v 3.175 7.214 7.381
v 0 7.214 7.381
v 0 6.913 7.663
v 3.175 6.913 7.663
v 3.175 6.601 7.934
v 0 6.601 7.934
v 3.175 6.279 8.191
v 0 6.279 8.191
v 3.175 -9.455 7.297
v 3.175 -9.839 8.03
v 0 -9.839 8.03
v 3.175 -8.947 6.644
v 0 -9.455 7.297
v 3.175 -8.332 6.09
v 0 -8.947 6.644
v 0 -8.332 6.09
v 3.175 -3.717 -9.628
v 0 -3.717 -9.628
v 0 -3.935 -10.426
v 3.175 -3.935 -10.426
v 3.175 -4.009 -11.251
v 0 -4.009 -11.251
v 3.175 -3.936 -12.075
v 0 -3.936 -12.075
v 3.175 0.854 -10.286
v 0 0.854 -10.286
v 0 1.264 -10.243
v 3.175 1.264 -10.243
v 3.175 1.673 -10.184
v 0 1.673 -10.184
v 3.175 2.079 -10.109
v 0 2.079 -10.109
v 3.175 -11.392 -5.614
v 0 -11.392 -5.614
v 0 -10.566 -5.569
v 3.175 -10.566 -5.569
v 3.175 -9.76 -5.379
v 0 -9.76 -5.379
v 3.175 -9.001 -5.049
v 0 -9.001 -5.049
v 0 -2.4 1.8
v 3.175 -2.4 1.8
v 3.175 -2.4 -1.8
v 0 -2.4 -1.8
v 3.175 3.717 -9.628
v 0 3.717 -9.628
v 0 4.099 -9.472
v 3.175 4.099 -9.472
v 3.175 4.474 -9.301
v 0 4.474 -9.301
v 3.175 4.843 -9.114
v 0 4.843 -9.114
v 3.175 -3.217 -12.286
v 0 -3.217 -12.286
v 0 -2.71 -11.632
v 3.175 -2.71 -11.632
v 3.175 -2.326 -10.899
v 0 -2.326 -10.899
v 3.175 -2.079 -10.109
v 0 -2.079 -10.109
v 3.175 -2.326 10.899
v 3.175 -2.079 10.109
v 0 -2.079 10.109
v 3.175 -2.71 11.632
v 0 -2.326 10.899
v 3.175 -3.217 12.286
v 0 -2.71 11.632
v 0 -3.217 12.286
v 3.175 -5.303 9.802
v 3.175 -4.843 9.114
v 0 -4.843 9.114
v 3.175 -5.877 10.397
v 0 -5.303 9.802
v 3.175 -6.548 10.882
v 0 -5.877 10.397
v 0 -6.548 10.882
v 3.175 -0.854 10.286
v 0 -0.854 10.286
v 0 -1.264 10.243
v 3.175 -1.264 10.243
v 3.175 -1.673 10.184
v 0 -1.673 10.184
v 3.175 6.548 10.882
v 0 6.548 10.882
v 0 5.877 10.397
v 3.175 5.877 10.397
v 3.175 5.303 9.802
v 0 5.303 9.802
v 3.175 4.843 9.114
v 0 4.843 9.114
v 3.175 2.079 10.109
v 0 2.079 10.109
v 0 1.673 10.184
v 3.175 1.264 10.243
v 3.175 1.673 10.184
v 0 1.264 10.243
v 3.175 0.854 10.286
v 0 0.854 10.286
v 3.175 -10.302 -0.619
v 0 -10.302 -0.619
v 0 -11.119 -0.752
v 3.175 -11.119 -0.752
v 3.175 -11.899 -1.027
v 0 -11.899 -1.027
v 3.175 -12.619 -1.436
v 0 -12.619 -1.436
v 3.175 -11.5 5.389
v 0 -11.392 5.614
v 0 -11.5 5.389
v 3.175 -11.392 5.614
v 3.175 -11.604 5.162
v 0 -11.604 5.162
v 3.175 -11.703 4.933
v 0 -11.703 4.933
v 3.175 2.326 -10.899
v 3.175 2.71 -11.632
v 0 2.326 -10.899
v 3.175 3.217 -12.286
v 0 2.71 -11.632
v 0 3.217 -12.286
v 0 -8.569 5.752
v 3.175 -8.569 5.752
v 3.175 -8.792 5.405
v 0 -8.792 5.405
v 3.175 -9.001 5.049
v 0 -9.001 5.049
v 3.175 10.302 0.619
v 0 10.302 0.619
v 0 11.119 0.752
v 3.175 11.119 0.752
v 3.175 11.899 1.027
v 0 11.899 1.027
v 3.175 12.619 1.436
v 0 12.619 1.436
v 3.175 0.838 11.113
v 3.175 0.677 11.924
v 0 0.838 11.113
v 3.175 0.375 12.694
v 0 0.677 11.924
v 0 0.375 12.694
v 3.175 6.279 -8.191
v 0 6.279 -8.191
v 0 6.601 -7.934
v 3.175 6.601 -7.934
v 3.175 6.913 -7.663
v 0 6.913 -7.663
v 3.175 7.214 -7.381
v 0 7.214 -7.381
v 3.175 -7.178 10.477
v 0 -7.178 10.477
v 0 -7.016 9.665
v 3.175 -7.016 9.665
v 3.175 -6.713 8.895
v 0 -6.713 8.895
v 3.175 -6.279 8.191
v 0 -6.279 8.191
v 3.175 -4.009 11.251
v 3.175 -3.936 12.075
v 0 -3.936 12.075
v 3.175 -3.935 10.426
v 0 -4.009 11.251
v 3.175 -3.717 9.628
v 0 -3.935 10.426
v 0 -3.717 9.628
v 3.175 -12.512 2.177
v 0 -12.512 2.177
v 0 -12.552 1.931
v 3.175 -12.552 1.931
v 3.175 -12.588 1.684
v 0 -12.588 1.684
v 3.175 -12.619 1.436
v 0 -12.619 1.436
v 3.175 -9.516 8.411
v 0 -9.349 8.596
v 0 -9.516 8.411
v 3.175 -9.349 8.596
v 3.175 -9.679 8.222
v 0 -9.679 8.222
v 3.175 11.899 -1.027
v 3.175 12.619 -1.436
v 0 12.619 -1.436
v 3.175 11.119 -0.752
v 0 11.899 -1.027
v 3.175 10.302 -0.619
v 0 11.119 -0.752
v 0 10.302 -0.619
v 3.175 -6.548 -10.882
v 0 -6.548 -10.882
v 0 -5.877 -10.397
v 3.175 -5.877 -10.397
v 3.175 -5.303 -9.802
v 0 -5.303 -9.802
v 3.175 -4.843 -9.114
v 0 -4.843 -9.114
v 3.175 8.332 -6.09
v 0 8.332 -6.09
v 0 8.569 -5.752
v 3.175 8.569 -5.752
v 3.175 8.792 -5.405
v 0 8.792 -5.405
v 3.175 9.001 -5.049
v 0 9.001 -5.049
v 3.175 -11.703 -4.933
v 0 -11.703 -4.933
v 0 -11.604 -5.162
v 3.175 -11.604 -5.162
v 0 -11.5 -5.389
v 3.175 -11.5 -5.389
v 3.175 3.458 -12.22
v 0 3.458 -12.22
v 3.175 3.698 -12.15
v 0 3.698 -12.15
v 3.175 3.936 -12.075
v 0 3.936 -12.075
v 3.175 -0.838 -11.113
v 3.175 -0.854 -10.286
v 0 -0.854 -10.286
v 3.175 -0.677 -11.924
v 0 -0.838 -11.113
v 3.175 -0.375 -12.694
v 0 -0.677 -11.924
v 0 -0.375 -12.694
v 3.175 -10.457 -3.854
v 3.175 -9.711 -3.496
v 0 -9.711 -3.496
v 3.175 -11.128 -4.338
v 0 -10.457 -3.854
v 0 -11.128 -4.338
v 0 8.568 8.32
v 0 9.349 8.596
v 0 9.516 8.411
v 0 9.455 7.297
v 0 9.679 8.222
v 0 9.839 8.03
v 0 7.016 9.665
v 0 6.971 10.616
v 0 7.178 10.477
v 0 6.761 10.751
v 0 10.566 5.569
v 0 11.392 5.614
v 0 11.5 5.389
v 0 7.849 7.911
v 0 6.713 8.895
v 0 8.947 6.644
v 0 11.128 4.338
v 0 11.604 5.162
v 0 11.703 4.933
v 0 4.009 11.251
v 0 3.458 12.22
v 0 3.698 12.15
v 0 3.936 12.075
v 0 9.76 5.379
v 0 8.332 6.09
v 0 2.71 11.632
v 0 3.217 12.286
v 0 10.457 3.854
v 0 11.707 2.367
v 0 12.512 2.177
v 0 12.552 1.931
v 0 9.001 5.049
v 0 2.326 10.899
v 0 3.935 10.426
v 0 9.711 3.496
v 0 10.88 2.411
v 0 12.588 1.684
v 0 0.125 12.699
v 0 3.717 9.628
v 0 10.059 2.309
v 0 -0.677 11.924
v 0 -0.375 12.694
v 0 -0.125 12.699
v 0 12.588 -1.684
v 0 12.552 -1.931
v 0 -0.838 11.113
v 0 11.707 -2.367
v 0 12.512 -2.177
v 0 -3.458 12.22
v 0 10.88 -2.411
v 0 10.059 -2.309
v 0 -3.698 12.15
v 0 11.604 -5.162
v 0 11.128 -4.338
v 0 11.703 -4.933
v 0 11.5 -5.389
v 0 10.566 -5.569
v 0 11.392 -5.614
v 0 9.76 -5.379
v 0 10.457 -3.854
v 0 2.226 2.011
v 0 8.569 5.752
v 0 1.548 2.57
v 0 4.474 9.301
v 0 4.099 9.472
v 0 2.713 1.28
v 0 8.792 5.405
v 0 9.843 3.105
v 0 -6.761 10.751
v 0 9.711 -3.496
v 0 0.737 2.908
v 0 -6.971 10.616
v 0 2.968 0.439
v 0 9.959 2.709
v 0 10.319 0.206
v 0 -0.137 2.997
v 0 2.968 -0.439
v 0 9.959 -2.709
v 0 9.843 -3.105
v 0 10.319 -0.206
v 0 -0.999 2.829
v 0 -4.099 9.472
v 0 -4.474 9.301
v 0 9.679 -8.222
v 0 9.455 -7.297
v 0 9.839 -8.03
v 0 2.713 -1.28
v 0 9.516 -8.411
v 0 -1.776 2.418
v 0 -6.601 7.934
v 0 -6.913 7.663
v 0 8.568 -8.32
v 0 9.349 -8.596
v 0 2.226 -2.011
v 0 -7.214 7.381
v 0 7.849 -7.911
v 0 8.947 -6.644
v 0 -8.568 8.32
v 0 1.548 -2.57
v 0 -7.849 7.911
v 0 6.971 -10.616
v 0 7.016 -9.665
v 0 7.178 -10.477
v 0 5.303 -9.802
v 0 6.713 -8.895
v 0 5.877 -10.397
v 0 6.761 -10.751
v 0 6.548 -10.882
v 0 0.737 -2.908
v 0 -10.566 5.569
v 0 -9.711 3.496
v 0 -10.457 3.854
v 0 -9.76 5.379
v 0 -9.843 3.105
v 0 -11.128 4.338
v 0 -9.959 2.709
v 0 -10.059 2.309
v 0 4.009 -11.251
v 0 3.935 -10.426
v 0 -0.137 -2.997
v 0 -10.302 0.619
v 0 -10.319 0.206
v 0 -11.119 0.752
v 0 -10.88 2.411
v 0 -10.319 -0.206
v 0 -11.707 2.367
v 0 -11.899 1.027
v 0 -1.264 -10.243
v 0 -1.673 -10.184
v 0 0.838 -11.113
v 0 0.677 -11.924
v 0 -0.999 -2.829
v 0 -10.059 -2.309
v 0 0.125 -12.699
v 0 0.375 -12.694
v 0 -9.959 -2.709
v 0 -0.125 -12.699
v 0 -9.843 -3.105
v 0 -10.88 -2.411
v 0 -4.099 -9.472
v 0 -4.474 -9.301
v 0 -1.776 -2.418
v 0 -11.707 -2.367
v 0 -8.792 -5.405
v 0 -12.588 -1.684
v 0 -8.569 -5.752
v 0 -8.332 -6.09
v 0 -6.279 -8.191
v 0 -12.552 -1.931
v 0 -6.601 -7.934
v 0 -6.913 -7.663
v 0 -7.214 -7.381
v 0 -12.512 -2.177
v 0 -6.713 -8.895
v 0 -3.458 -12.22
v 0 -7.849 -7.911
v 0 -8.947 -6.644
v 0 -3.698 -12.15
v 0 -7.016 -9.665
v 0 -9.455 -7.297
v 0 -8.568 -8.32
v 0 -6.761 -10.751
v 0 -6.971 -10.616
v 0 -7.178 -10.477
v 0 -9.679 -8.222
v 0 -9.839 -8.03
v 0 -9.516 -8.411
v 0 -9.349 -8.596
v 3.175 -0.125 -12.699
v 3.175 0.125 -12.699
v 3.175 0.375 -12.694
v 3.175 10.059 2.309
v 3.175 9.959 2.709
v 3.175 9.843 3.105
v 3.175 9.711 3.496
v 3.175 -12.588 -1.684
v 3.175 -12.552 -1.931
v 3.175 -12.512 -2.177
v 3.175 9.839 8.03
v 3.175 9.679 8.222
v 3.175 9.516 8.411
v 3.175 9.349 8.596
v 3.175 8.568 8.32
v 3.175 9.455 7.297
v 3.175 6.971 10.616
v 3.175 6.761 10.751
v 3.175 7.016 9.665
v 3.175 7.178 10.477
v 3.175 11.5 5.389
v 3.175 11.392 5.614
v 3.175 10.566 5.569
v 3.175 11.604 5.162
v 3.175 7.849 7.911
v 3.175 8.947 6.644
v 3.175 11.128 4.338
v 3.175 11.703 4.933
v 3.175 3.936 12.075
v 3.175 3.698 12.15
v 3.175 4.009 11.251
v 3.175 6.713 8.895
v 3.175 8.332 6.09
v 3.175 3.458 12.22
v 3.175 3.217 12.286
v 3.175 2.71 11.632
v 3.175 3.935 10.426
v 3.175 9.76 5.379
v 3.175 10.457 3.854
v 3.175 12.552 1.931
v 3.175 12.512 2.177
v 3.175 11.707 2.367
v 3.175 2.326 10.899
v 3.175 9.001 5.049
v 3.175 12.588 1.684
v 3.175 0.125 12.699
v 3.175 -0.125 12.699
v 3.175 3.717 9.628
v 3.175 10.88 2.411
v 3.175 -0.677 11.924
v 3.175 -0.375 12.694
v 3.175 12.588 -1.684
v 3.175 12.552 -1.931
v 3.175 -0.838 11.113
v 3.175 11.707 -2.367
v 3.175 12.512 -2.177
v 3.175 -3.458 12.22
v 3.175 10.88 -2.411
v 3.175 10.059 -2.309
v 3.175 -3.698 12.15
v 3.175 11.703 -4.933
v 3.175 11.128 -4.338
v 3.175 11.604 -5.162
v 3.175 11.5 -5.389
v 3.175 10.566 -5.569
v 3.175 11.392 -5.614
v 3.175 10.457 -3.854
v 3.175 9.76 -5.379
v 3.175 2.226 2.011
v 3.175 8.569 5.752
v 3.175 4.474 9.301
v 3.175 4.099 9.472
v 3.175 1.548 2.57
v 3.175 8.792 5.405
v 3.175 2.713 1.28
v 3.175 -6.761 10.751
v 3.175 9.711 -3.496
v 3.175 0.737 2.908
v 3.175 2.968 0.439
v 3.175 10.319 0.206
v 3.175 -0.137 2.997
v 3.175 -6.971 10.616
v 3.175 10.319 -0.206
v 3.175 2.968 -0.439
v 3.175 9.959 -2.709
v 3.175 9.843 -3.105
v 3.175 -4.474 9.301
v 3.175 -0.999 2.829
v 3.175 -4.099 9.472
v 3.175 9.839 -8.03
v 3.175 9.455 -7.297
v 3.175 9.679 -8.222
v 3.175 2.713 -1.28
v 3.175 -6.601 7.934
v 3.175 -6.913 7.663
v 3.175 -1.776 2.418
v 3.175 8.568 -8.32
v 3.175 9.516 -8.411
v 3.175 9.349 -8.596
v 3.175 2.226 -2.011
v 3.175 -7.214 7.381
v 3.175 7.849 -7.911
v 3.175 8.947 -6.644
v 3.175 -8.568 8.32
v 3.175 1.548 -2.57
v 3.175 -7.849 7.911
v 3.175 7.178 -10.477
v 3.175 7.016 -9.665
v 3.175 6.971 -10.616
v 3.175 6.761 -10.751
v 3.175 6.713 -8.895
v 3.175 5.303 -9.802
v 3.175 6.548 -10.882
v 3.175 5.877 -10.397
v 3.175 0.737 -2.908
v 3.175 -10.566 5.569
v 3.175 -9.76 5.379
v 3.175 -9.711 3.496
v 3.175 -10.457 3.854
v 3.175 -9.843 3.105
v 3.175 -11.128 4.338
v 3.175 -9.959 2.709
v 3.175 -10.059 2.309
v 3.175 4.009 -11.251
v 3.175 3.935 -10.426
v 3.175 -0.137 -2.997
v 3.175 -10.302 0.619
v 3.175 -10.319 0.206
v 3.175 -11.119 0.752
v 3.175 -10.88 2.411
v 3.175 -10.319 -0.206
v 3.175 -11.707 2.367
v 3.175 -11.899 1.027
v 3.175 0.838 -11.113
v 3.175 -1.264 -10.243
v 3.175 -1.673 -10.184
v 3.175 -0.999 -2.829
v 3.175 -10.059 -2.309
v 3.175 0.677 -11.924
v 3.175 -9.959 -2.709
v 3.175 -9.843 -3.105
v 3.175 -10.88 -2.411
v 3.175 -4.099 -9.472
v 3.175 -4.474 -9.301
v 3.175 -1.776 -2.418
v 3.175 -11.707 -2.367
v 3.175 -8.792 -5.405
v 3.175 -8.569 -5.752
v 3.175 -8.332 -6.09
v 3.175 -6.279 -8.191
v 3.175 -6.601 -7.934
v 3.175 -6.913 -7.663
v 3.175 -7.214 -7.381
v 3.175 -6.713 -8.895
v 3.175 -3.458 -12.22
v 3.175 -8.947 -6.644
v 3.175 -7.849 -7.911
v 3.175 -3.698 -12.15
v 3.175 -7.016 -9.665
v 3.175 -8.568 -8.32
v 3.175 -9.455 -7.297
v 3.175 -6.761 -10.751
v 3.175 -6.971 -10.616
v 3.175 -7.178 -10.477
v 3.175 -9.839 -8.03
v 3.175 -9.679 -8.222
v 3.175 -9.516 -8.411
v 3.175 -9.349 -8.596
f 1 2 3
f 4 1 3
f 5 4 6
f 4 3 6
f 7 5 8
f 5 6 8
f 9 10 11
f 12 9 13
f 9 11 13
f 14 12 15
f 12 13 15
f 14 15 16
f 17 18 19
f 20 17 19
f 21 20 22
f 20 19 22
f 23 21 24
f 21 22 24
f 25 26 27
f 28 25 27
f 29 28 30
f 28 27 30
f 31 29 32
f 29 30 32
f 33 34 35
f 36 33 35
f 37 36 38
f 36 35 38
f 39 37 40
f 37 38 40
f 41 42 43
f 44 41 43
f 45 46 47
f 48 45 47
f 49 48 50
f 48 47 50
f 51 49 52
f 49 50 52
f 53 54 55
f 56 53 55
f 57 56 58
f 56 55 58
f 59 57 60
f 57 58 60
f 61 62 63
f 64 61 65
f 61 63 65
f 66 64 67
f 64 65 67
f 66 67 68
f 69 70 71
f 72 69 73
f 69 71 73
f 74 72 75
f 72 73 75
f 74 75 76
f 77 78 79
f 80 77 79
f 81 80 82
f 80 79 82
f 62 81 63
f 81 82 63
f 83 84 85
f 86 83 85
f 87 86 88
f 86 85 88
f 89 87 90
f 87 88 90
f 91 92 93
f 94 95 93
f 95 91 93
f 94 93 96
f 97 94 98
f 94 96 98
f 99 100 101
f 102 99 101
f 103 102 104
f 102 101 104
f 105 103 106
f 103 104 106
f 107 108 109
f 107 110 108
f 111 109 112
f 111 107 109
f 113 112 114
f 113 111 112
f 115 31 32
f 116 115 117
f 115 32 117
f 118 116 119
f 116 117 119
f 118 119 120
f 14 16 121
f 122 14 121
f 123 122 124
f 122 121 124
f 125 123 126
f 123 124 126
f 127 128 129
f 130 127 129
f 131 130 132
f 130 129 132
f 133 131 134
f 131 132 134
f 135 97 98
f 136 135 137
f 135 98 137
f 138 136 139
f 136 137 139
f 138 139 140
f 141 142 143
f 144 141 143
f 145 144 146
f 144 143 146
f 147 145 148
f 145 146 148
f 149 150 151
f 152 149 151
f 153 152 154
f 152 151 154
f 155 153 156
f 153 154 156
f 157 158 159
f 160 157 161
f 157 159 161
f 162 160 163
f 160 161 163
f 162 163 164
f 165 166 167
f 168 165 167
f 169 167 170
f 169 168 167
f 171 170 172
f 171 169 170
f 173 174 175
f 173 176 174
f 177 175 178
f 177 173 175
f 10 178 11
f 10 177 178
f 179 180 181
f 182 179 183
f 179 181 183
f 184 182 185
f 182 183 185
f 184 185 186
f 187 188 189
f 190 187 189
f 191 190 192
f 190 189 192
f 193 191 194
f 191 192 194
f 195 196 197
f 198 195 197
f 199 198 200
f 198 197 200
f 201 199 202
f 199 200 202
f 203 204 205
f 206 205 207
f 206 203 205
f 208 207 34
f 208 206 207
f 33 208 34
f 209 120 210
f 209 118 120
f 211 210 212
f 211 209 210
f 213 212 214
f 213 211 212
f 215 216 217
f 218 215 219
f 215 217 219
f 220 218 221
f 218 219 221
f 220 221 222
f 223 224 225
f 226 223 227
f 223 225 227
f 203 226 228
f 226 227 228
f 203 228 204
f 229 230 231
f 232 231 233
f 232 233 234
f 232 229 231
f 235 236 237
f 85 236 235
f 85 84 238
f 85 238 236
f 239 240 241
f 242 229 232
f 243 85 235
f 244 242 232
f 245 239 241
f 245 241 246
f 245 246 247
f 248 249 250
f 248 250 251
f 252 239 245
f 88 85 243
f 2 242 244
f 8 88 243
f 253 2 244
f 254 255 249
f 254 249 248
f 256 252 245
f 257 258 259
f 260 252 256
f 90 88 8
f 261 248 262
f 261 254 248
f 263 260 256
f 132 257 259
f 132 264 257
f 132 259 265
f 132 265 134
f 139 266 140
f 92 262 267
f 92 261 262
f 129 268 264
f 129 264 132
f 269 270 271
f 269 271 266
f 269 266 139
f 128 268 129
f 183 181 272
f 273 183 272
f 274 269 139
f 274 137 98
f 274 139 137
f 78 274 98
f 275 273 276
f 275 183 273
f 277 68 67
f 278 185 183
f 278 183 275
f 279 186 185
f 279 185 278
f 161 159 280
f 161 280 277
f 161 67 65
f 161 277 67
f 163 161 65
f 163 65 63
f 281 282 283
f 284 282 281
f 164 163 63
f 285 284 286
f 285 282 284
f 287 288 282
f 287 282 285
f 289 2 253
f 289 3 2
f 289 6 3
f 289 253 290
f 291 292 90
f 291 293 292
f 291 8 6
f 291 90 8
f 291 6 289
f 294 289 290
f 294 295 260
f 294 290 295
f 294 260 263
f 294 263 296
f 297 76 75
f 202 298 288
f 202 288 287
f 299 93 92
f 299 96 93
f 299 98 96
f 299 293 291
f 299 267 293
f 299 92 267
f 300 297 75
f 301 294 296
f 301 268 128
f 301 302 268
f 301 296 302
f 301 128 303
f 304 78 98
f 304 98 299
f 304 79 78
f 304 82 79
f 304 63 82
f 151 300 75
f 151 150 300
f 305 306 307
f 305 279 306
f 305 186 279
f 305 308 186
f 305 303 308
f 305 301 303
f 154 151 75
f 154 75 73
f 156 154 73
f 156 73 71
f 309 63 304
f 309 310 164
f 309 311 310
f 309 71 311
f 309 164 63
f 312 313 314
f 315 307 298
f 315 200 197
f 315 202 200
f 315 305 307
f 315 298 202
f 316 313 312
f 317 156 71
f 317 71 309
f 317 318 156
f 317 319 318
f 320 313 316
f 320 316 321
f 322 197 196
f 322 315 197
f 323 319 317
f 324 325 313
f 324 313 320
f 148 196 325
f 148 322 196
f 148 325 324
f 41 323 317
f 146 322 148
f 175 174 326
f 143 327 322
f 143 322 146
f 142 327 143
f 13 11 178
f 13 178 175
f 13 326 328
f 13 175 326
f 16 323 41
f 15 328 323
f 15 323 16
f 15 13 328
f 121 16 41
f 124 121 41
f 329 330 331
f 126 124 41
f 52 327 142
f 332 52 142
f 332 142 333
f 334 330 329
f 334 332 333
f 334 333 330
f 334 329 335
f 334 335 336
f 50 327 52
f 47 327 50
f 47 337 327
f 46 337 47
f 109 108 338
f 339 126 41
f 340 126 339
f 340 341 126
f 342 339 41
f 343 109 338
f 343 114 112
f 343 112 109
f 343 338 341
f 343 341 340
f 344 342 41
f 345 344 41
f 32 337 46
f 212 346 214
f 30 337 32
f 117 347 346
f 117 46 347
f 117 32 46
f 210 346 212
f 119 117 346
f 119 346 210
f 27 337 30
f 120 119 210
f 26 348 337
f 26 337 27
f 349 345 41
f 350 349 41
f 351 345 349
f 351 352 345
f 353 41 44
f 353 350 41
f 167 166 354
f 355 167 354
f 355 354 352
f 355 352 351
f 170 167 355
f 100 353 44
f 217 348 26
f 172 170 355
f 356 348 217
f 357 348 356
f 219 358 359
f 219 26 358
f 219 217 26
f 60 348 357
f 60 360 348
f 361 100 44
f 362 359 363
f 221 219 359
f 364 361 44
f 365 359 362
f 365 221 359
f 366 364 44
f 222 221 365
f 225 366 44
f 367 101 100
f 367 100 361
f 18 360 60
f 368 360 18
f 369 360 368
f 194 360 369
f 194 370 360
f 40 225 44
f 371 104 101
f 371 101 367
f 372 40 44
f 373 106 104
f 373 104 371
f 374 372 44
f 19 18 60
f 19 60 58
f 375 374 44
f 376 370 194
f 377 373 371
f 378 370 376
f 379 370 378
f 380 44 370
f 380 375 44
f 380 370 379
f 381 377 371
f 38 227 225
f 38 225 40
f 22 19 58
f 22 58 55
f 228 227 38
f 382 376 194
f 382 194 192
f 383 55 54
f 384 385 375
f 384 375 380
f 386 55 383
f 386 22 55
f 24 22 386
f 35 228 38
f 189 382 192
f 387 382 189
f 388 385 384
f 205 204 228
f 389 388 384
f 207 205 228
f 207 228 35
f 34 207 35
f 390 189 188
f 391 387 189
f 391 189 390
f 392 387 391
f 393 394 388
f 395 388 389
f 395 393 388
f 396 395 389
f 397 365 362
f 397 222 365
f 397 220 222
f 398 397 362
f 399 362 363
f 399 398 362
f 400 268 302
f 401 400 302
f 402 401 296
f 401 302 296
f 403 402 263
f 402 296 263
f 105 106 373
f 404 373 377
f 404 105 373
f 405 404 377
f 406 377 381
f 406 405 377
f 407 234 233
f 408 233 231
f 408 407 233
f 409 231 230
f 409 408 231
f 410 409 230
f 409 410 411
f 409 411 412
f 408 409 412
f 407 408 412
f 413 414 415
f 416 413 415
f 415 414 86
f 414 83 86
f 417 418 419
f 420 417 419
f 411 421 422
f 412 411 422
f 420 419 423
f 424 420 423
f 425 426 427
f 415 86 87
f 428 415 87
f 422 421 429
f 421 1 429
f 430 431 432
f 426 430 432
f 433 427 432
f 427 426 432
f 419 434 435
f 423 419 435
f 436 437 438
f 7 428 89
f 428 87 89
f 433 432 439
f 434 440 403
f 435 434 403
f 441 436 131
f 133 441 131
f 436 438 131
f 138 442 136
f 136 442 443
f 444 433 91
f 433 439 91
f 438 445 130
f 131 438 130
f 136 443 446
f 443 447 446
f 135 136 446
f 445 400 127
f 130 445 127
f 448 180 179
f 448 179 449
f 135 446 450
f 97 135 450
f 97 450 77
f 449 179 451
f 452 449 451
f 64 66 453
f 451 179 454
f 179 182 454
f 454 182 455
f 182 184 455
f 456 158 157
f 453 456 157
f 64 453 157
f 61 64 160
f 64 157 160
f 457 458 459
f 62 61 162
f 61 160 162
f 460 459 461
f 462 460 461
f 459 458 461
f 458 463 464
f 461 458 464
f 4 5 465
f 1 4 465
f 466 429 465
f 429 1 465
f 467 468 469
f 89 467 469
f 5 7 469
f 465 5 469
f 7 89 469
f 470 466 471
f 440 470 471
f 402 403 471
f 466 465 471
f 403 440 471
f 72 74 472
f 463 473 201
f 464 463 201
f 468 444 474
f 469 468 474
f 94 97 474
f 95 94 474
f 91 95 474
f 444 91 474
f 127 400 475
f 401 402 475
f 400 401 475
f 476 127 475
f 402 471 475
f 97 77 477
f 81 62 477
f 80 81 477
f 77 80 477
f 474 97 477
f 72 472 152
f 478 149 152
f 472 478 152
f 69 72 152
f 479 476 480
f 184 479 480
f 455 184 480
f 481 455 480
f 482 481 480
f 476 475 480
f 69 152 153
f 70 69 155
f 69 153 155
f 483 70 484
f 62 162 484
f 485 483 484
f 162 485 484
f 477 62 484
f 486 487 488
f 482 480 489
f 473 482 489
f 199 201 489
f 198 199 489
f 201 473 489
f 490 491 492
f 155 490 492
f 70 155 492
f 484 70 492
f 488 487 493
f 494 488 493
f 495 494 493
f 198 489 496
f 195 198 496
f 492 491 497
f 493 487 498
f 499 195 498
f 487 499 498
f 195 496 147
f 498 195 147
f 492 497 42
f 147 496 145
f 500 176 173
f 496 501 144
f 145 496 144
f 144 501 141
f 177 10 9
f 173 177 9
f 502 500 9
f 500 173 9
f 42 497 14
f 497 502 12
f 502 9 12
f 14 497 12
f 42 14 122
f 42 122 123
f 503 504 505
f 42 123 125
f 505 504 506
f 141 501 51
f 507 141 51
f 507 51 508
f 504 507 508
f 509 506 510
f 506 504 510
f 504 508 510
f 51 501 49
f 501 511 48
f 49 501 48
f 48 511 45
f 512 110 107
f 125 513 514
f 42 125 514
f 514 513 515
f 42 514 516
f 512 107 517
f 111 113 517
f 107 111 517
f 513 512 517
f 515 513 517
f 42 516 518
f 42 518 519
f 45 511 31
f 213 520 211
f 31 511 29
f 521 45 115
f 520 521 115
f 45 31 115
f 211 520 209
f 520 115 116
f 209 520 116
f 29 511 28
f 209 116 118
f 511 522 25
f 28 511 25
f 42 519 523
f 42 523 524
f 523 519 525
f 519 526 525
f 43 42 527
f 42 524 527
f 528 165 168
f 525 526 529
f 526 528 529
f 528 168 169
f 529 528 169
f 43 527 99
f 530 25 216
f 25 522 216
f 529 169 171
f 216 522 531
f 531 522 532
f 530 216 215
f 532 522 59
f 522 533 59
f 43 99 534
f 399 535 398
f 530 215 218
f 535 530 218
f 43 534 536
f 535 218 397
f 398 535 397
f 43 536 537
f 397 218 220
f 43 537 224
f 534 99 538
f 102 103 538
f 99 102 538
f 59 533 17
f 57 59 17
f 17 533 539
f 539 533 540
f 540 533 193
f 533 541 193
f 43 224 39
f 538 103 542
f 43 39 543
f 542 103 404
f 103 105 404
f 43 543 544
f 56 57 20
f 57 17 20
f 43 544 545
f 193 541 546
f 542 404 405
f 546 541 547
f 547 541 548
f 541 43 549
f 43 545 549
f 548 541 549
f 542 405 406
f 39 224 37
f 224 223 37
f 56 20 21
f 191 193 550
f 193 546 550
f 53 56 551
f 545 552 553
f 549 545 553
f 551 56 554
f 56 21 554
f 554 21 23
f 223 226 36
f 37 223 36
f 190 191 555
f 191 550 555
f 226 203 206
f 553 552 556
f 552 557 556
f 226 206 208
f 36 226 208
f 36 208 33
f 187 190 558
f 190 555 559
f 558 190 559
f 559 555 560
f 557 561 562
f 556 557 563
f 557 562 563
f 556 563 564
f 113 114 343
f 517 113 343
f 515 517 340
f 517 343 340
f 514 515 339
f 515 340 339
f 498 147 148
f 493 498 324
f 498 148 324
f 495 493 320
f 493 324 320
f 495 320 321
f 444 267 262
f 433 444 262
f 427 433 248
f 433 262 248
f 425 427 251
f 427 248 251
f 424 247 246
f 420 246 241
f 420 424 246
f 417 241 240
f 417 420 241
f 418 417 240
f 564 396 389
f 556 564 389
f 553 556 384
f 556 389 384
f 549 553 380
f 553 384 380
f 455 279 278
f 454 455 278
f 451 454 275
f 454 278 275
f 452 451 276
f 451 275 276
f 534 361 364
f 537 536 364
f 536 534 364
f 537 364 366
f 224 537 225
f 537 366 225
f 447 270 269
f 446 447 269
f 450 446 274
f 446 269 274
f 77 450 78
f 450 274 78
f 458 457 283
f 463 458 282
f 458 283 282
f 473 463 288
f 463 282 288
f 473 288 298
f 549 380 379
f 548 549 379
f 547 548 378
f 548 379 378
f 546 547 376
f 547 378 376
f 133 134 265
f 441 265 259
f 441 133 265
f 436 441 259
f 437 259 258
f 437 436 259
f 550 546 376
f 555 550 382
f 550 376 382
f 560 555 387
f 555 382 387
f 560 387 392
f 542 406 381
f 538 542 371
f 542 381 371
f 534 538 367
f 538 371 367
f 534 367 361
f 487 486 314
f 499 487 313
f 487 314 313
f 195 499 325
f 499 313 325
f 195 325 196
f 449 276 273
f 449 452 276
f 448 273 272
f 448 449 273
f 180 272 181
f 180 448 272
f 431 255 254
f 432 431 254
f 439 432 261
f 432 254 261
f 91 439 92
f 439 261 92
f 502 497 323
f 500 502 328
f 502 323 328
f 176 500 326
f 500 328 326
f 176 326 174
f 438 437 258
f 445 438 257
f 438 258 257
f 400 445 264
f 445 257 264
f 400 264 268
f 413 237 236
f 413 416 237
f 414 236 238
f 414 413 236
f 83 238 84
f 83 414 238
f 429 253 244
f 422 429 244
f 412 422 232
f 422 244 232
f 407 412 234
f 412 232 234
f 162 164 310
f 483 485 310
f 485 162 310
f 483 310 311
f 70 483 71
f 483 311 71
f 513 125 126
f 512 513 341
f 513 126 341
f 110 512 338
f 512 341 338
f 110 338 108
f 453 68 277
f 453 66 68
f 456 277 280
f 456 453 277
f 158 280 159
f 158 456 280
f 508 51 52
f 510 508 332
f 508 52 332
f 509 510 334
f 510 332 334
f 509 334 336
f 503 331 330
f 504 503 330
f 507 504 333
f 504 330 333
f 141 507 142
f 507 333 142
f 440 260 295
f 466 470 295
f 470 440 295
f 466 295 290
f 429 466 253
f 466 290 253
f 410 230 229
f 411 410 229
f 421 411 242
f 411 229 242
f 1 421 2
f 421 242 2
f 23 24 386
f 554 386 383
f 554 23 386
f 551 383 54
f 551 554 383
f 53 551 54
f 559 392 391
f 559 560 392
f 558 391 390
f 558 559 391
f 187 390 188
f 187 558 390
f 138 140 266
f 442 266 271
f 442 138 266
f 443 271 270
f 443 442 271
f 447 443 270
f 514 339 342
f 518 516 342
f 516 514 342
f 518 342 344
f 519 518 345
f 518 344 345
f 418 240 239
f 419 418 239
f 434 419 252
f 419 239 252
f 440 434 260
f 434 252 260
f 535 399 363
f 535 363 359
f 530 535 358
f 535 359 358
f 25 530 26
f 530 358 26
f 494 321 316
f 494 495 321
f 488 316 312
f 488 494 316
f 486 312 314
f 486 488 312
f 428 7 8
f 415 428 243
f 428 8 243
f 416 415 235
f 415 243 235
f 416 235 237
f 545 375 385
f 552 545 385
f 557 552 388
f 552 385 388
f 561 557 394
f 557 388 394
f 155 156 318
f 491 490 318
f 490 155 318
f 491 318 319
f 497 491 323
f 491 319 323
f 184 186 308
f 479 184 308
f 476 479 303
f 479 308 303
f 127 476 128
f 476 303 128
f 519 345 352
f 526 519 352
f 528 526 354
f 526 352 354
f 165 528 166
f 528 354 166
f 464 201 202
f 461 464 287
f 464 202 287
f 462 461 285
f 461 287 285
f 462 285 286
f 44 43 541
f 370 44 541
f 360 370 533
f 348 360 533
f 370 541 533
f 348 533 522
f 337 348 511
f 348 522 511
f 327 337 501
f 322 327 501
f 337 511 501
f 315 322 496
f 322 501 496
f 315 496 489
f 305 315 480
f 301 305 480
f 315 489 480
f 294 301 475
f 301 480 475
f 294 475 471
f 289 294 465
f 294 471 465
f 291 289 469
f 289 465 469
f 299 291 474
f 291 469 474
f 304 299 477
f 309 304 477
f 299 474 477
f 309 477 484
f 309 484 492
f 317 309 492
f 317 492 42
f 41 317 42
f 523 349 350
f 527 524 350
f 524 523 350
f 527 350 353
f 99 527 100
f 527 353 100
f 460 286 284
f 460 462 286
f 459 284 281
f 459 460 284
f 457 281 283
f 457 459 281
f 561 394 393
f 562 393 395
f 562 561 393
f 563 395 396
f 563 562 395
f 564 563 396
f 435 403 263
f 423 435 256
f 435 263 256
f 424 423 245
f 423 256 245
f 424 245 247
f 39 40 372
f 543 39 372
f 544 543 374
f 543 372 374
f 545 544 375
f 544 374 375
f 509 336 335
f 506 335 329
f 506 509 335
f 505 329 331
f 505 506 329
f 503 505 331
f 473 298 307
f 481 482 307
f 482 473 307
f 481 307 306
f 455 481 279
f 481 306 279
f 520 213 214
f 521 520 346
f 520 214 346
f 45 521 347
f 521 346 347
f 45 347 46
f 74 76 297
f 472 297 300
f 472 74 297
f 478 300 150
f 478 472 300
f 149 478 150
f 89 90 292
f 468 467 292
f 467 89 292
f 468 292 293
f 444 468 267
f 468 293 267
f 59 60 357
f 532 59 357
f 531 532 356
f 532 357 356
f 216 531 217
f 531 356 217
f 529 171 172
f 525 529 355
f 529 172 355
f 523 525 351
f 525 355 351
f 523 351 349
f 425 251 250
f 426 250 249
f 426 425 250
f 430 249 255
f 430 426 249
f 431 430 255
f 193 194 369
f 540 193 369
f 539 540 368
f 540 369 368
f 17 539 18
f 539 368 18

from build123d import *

# Parameters (mm, degrees)
BASPROSKE_W        = 3.175
BASPROSKE_H        = 12.7
TOOTHCUT_DEPTH     = 19.238986403
TEETHCUTS_COUNT    = 22
TEETHCUTS_ANGLE    = 343.636363636
CUT_EXTRUDE1_REACH = 20.182


with BuildPart() as part:
    # BasProSke → Base-Revolve (revolve)
    with BuildSketch(Plane(origin=(0, 0, 0), x_dir=(1, 0, 0), z_dir=(0, 1, 0)), mode=Mode.PRIVATE) as base_revolve_sk:
        with Locations((1.5875, 6.35)):
            Rectangle(BASPROSKE_W, BASPROSKE_H)
    revolve(base_revolve_sk.sketch.rotate(Axis((-10, 0, 0), (1, 0, 0)), 180), axis=Axis((-10, 0, 0), (1, 0, 0)))

    # TooCutSke → ToothCut (cut, through all)
    with BuildSketch(Plane(origin=(0, 0, 0), x_dir=(0, 0, -1), z_dir=(1, 0, 0))):
        with BuildLine():
            ThreePointArc((0.618908626, 10.302292991), (0, 10.320866667), (-0.618908626, 10.302292991))
            ThreePointArc((-0.618908626, 10.302292991), (-0.876745986, 11.528868728), (-1.452383887, 12.64224609))
            ThreePointArc((-1.452383887, 12.64224609), (0, 12.7254), (1.452383887, 12.64224609))
            ThreePointArc((1.452383887, 12.64224609), (0.876745986, 11.528868728), (0.618908626, 10.302292991))
        make_face()
    toothcut = extrude(amount=TOOTHCUT_DEPTH, mode=Mode.SUBTRACT)

    # TeethCuts: ToothCut ×22 about axis
    teethcuts_axis = Axis((-10, 0, 0), (1, 0, 0))
    for i in range(1, TEETHCUTS_COUNT):
        add(toothcut.rotate(teethcuts_axis, i * TEETHCUTS_ANGLE / (TEETHCUTS_COUNT - 1)), mode=Mode.SUBTRACT)

    # Sketch1 → Cut-Extrude1 (cut, up to next)
    with BuildSketch(Plane(origin=(3.175, 0, 0), x_dir=(0, 0, -1), z_dir=(1, 0, 0)), mode=Mode.PRIVATE) as cut_extrude1_sk1:
        with BuildLine():
            Line((-1.8, -2.4), (1.8, -2.4))
            ThreePointArc((1.8, -2.4), (0, 3), (-1.8, -2.4))
        make_face()
    cut_extrude1_tool1 = extrude(cut_extrude1_sk1.sketch, amount=-CUT_EXTRUDE1_REACH, mode=Mode.PRIVATE) & part.part
    add(cut_extrude1_tool1.solids().sort_by_distance((3.175, 0.145059, 0))[0], mode=Mode.SUBTRACT)


solid = part.part
